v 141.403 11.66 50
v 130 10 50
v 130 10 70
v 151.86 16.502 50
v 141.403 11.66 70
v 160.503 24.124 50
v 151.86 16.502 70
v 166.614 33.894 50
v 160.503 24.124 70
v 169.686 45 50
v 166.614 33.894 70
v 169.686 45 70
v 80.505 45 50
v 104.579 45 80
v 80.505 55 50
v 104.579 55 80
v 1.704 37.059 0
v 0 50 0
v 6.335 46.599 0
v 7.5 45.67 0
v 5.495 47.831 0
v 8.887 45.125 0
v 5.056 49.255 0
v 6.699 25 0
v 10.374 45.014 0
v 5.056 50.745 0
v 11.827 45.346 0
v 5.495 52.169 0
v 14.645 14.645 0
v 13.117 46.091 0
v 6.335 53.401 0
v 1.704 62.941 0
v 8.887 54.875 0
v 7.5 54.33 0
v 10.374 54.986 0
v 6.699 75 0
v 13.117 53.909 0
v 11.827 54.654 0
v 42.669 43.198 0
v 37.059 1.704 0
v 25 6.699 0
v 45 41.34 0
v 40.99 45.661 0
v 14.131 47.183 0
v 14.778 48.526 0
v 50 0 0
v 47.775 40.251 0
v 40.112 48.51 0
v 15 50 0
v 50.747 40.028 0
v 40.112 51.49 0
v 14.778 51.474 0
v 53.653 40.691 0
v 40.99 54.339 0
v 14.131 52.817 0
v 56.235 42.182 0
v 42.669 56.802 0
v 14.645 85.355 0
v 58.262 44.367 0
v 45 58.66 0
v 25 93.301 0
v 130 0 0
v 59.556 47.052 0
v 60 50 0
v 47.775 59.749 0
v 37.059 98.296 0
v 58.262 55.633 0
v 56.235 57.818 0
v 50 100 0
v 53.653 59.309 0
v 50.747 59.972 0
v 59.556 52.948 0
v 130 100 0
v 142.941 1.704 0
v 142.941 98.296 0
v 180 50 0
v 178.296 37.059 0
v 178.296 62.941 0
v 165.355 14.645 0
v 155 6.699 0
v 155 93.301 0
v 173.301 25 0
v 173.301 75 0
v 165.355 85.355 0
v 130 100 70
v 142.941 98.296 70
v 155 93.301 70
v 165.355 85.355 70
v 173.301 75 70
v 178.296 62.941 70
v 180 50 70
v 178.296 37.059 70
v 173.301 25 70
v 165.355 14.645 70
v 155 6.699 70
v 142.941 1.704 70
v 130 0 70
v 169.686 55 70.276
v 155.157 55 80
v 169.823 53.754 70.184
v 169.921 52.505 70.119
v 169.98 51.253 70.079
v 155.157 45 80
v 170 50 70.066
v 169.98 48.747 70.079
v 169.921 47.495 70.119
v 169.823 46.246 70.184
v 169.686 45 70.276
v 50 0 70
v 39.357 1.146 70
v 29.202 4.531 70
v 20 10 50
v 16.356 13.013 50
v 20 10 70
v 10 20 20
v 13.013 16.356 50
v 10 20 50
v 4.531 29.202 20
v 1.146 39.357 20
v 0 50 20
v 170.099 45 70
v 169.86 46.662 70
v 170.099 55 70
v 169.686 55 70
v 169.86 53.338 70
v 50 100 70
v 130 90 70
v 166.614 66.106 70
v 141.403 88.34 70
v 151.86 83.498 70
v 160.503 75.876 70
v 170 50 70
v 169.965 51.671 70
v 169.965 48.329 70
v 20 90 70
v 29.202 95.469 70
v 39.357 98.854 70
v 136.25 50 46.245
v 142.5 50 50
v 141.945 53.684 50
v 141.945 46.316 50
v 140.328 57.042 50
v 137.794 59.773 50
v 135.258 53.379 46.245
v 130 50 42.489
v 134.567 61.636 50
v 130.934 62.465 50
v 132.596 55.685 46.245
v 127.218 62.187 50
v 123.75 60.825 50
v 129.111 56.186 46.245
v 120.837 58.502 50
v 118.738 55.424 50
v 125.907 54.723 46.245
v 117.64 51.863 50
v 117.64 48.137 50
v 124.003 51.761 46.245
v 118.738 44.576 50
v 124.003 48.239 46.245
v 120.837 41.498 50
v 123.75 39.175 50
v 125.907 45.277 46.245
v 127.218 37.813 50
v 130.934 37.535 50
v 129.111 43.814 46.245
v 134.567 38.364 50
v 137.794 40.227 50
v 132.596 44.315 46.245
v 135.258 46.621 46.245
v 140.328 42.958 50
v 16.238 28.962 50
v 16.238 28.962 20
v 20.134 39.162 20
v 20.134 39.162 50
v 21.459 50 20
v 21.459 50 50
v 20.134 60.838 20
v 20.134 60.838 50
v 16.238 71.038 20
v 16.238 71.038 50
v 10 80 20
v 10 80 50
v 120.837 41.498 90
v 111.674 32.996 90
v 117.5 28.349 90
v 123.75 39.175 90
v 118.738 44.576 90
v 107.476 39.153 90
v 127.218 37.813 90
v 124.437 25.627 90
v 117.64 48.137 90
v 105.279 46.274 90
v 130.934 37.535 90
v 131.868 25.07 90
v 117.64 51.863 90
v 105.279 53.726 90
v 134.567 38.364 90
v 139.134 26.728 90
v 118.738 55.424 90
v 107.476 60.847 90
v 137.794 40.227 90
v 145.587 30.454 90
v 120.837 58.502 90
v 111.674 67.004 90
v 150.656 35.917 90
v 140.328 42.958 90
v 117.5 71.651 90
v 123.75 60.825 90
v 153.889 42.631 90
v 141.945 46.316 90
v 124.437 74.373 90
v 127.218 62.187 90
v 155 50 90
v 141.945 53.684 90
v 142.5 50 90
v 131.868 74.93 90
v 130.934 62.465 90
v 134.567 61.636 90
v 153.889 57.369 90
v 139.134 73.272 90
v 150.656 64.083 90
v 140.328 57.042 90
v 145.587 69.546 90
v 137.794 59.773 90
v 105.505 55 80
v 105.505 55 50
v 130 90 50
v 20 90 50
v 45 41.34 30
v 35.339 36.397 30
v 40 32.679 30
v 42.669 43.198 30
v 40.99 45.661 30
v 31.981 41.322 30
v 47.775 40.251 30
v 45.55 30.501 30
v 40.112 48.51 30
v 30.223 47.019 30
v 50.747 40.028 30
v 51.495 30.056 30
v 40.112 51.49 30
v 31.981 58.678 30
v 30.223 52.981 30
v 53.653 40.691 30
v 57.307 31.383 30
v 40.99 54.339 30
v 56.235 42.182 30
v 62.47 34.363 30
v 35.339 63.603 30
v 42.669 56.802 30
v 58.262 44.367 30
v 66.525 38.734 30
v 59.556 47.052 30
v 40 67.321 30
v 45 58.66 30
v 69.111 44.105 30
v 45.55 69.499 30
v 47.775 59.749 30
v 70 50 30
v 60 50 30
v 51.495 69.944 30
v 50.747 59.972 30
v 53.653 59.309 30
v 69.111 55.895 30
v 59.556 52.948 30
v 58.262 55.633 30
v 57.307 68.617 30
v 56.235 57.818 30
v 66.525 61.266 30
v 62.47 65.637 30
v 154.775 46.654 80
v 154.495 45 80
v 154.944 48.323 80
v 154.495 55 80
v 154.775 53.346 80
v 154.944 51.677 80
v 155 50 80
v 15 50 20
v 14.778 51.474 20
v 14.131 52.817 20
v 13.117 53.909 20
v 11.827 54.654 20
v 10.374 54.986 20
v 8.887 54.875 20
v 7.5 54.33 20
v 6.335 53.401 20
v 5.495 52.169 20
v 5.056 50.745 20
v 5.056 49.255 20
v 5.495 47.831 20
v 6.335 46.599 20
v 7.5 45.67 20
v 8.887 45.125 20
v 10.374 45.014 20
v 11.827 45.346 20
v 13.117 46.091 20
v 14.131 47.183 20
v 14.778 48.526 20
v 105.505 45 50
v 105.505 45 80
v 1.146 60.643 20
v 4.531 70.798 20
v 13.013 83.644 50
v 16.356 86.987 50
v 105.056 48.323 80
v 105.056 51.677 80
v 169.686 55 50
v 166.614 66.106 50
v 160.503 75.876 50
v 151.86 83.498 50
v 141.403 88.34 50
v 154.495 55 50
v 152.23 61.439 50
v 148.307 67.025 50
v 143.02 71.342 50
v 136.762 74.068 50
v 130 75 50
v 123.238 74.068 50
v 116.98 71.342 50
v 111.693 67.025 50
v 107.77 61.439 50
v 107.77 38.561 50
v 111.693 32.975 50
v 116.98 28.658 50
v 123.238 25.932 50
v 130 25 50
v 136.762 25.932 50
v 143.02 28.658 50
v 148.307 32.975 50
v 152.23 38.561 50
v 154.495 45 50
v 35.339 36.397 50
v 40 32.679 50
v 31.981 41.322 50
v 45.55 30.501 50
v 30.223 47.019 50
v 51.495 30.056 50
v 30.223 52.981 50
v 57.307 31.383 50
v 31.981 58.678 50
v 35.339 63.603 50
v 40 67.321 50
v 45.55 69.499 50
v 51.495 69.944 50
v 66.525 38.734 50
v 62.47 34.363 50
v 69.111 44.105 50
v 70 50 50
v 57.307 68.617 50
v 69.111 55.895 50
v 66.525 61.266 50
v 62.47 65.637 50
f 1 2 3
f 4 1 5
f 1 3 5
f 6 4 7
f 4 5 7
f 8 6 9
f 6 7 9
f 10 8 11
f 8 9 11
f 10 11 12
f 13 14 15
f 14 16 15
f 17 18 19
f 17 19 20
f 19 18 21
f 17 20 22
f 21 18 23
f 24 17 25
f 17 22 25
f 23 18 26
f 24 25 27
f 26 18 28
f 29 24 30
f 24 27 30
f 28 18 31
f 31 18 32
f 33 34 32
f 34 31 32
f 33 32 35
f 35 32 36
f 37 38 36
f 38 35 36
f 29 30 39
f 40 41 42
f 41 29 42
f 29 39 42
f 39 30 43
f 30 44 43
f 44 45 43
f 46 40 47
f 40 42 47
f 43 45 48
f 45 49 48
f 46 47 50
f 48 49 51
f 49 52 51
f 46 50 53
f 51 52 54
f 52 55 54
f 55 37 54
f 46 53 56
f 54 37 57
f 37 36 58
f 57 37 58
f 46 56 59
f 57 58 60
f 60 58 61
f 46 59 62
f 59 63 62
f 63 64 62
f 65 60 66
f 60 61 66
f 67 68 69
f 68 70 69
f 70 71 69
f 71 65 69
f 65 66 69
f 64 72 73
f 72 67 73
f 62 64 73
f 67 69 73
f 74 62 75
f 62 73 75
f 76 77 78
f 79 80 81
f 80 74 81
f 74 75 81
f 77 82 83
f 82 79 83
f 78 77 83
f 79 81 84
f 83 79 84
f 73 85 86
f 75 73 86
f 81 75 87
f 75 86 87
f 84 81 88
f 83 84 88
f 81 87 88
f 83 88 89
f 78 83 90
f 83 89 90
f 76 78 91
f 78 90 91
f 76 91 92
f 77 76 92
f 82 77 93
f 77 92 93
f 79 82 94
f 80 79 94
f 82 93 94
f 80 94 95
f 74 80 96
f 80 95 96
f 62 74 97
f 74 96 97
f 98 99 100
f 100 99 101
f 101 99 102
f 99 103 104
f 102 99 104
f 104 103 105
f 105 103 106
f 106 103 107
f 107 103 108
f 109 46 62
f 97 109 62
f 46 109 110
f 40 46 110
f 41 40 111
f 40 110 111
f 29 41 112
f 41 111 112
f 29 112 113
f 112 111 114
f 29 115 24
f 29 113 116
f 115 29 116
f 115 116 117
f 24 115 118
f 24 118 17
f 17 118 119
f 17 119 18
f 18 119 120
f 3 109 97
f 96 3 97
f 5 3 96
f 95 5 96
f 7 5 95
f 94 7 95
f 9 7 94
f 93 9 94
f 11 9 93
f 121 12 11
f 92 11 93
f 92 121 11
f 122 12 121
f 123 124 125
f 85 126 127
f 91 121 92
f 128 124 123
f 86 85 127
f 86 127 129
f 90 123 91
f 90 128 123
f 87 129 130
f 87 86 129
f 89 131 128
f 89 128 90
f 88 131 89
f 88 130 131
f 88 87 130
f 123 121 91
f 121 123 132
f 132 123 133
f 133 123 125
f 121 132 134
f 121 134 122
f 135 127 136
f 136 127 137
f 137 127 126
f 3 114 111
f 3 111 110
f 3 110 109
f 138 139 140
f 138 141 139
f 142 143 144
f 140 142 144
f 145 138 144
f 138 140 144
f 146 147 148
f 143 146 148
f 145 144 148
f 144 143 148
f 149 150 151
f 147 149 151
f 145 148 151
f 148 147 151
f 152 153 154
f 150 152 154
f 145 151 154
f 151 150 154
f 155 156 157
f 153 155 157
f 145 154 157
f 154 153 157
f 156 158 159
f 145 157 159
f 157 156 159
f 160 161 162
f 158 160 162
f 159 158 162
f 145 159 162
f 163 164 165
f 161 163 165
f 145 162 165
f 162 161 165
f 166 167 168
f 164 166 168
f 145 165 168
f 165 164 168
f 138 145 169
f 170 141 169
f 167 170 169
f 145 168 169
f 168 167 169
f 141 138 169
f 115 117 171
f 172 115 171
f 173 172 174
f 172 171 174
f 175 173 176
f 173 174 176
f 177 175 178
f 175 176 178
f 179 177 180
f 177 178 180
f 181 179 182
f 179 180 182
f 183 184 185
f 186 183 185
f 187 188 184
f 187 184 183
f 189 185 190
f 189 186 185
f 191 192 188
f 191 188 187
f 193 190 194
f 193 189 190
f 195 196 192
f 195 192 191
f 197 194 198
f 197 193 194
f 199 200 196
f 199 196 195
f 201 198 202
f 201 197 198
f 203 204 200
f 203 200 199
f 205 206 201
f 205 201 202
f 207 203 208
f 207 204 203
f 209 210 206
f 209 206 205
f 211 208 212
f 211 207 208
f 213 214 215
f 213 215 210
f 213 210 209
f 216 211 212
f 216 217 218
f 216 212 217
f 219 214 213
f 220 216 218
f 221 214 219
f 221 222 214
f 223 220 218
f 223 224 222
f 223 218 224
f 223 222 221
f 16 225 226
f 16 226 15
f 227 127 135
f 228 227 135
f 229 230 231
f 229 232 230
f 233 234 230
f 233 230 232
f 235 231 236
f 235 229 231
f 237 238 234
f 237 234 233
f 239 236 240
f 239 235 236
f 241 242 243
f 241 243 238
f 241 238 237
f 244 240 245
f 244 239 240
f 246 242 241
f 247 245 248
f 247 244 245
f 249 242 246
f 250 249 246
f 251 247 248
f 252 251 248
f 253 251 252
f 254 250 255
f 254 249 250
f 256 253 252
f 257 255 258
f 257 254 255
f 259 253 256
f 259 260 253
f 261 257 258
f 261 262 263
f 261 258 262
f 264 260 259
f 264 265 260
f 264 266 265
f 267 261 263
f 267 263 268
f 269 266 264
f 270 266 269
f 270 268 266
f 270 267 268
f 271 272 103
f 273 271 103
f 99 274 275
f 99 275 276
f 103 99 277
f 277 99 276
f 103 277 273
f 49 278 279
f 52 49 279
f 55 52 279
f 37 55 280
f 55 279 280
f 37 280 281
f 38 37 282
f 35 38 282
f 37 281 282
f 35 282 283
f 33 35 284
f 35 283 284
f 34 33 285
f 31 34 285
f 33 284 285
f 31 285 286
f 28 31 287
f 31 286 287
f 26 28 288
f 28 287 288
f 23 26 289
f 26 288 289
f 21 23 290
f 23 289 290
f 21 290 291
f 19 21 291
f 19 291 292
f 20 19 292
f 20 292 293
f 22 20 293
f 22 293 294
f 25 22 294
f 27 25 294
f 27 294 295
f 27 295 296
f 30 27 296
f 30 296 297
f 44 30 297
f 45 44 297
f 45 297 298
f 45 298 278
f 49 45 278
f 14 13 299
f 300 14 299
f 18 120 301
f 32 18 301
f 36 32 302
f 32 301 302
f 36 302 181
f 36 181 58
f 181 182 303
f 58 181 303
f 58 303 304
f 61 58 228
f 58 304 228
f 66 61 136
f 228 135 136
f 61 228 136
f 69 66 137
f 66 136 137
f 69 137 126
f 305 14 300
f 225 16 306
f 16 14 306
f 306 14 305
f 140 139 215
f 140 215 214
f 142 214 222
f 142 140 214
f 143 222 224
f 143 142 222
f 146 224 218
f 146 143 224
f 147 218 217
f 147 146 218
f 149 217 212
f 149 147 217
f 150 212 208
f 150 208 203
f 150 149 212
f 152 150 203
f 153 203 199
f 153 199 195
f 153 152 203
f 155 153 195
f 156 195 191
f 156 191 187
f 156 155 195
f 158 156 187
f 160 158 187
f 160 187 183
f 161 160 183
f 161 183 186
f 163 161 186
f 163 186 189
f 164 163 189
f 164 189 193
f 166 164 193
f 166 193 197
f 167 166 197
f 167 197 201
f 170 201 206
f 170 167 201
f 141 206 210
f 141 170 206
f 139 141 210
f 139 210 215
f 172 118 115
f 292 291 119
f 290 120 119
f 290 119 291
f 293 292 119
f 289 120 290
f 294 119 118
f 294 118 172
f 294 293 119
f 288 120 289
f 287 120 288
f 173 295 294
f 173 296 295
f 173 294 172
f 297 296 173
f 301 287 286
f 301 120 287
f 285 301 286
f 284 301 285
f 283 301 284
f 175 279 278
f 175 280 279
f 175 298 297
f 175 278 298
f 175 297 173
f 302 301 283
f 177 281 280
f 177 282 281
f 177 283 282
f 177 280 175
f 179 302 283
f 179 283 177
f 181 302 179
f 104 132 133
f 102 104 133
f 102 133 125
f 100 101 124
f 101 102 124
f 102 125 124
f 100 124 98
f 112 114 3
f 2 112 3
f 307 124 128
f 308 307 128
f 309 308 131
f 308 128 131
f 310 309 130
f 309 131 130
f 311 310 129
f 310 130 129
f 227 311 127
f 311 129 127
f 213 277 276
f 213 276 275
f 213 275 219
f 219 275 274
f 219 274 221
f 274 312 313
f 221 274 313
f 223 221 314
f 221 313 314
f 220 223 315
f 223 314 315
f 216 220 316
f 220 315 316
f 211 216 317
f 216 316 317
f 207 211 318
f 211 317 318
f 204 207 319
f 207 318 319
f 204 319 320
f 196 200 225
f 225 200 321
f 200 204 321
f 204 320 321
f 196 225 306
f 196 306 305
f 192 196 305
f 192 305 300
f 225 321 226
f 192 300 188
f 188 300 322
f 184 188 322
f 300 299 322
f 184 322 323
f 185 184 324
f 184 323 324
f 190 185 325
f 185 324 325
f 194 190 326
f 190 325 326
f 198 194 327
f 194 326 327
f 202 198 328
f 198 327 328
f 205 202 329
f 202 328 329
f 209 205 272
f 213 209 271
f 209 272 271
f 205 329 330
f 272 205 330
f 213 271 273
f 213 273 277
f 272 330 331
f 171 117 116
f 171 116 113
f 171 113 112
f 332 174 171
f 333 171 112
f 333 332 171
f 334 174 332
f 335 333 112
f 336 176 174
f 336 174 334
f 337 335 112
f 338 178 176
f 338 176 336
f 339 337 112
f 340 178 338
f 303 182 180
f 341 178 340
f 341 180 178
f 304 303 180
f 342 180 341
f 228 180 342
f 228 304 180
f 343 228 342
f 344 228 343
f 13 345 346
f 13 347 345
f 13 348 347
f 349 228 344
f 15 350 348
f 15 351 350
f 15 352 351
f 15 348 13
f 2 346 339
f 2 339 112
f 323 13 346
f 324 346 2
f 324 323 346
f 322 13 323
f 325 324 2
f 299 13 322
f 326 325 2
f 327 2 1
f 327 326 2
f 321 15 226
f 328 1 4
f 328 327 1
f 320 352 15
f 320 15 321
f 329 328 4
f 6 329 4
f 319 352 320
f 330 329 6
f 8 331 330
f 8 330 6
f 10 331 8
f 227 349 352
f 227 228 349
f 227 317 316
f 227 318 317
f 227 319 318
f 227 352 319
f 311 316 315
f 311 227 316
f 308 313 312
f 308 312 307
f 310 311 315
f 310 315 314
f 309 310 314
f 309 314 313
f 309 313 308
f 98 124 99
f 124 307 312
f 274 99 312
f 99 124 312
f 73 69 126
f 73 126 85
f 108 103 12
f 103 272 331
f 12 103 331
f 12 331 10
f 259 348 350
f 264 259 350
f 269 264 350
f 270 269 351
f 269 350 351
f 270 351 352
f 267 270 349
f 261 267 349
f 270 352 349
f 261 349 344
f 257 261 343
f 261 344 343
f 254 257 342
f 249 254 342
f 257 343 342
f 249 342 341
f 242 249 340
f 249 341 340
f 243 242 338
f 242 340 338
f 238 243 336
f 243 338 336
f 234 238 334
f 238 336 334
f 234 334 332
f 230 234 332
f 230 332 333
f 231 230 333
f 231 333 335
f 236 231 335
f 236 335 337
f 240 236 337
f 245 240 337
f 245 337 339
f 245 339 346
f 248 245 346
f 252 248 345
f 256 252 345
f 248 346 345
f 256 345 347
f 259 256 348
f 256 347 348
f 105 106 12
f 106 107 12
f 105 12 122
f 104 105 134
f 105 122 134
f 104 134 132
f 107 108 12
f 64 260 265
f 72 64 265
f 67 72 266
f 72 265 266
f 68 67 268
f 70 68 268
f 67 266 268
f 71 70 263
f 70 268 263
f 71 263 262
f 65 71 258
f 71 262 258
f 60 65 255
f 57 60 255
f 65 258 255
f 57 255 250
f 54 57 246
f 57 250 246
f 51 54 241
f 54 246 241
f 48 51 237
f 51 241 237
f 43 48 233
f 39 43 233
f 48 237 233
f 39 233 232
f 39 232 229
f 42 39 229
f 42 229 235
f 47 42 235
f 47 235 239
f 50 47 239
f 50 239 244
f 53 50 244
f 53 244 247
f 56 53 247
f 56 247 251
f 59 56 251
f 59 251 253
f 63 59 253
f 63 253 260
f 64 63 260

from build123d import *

# Parameters (mm, degrees)
SKETCH1_W                  = 180
SKETCH1_H                  = 100
BOSS_EXTRUDE2_DEPTH        = 70
CUT_EXTRUDE1_DEPTH         = 70
SKETCH3_R                  = 5
CUT_EXTRUDE2_DEPTH         = 70
SKETCH4_R                  = 5
CUT_EXTRUDE3_DEPTH         = 50
SKETCH5_R                  = 10
CUT_EXTRUDE4_DEPTH         = 106
SKETCH6_R                  = 15
CUT_EXTRUDE5_DEPTH         = 40
SKETCH8_R                  = 15
SKETCH8_R_2                = 12.5
BOSS_EXTRUDE3_DEPTH        = 40
SKETCH10_R                 = 12.5
BOSS_EXTRUDE4_DEPTH        = 65
F_25_0MM_DOWEL_HOLE2_D     = 25
F_25_0MM_DOWEL_HOLE2_DEPTH = 20
F_25_0MM_DOWEL_HOLE2_TIP   = 7.510757738
SKETCH12_R                 = 10
SKETCH12_R_2               = 12.5
CUT_EXTRUDE6_DEPTH         = 20
SKETCH13_R                 = 25
SKETCH13_R_2               = 12.5
BOSS_EXTRUDE5_DEPTH        = 40
SKETCH14_R                 = 20
SKETCH14_R_2               = 10
CUT_EXTRUDE7_DEPTH         = 20
BOSS_EXTRUDE10_DEPTH       = 30
BOSS_EXTRUDE13_DEPTH       = 30
CUT_EXTRUDE8_DEPTH         = 5


with BuildPart() as part:
    # Sketch1 → Boss-Extrude2 (new body)
    with BuildSketch(Plane.XY):
        with Locations((90, 50)):
            Rectangle(SKETCH1_W, SKETCH1_H)
    extrude(amount=BOSS_EXTRUDE2_DEPTH)

    # Sketch2 → Cut-Extrude1 (cut)
    with BuildSketch(Plane.XY.offset(70)):
        with BuildLine():
            Line((50, 100), (0, 100))
            Line((0, 100), (0, 50))
            ThreePointArc((0, 50), (14.644660941, 85.355339059), (50, 100))
        make_face()
        with BuildLine():
            ThreePointArc((50, 0), (14.644660941, 14.644660941), (0, 50))
            Line((0, 50), (0, 0))
            Line((0, 0), (50, 0))
        make_face()
        with BuildLine():
            Line((180, 0), (180, 50))
            ThreePointArc((180, 50), (165.355339059, 14.644660941), (130, 0))
            Line((130, 0), (180, 0))
        make_face()
        with BuildLine():
            Line((180, 100), (130, 100))
            ThreePointArc((130, 100), (165.355339059, 85.355339059), (180, 50))
            Line((180, 50), (180, 100))
        make_face()
    extrude(amount=-CUT_EXTRUDE1_DEPTH, mode=Mode.SUBTRACT)

    # Sketch3 → Cut-Extrude2 (cut)
    with BuildSketch(Plane.XY.offset(70)):
        with Locations((10, 50)):
            Circle(SKETCH3_R)
    extrude(amount=-CUT_EXTRUDE2_DEPTH, mode=Mode.SUBTRACT)

    # Sketch4 → Cut-Extrude3 (cut)
    with BuildSketch(Plane.XY.offset(70)):
        with BuildLine():
            ThreePointArc((10, 20), (21.458980338, 50), (10, 80))
            ThreePointArc((10, 80), (0, 50), (10, 20))
        make_face()
        with Locations((10, 50)):
            Circle(SKETCH4_R, mode=Mode.SUBTRACT)
    extrude(amount=-CUT_EXTRUDE3_DEPTH, mode=Mode.SUBTRACT)

    # Sketch5 → Cut-Extrude4 (cut)
    with BuildSketch(Plane.XY.offset(70)):
        with Locations((50, 50)):
            Circle(SKETCH5_R)
    extrude(amount=-CUT_EXTRUDE4_DEPTH, mode=Mode.SUBTRACT)

    # Sketch6 → Cut-Extrude5 (cut)
    with BuildSketch(Plane.XY.offset(70)):
        with Locations((130, 50)):
            Circle(SKETCH6_R)
    extrude(amount=-CUT_EXTRUDE5_DEPTH, mode=Mode.SUBTRACT)

    # Sketch8 → Boss-Extrude3 (add)
    with BuildSketch(Plane.XY.offset(70)):
        with Locations((130, 50)):
            Circle(SKETCH8_R)
        with Locations((130, 50)):
            Circle(SKETCH8_R_2, mode=Mode.SUBTRACT)
    extrude(amount=-BOSS_EXTRUDE3_DEPTH)

    # Sketch10 → Boss-Extrude4 (add)
    with BuildSketch(Plane.XY.offset(70)):
        with Locations((130, 50)):
            Circle(SKETCH10_R)
    extrude(amount=-BOSS_EXTRUDE4_DEPTH)

    # Ø25.0mm Dowel Hole2
    with Locations(Plane(origin=(130, 50, 70), x_dir=(1, 0, 0), z_dir=(0, 0, 1))):
        with Locations((0, 0)):
            Hole(F_25_0MM_DOWEL_HOLE2_D / 2, depth=F_25_0MM_DOWEL_HOLE2_DEPTH)
            with Locations((0, 0, -(F_25_0MM_DOWEL_HOLE2_DEPTH + F_25_0MM_DOWEL_HOLE2_TIP / 2))):  # 118° drill point
                Cone(0, F_25_0MM_DOWEL_HOLE2_D / 2, F_25_0MM_DOWEL_HOLE2_TIP, mode=Mode.SUBTRACT)

    # Sketch12 → Cut-Extrude6 (cut)
    with BuildSketch(Plane.XY.offset(70)):
        with BuildLine():
            ThreePointArc((130, 10), (170, 50), (130, 90))
            Line((130, 90), (20, 90))
            ThreePointArc((20, 90), (14.644660941, 85.355339059), (10, 80))
            ThreePointArc((10, 80), (21.458980338, 50), (10, 20))
            ThreePointArc((10, 20), (14.644660941, 14.644660941), (20, 10))
            Line((20, 10), (130, 10))
        make_face()
        with Locations((50, 50)):
            Circle(SKETCH12_R, mode=Mode.SUBTRACT)
        with Locations((130, 50)):
            Circle(SKETCH12_R_2, mode=Mode.SUBTRACT)
    extrude(amount=-CUT_EXTRUDE6_DEPTH, mode=Mode.SUBTRACT)

    # Sketch13 → Boss-Extrude5 (add)
    with BuildSketch(Plane.XY.offset(50)):
        with Locations((130, 50)):
            Circle(SKETCH13_R)
        with Locations((130, 50)):
            Circle(SKETCH13_R_2, mode=Mode.SUBTRACT)
    extrude(amount=BOSS_EXTRUDE5_DEPTH)

    # Sketch14 → Cut-Extrude7 (cut)
    with BuildSketch(Plane.XY.offset(50)):
        with Locations((50, 50)):
            Circle(SKETCH14_R)
        with Locations((50, 50)):
            Circle(SKETCH14_R_2, mode=Mode.SUBTRACT)
    extrude(amount=-CUT_EXTRUDE7_DEPTH, mode=Mode.SUBTRACT)

    # Sketch15 → Boss-Extrude10 (add)
    with BuildSketch(Plane.XY.offset(50)):
        with BuildLine():
            Line((105.505102572, 45), (105.505102572, 55))
            ThreePointArc((105.505102572, 55), (105, 50), (105.505102572, 45))
        make_face()
        with BuildLine():
            ThreePointArc((105.505102572, 45), (105, 50), (105.505102572, 55))
            Line((105.505102572, 55), (80.505102572, 55))
            Line((80.505102572, 55), (80.505102572, 45))
            Line((80.505102572, 45), (105.505102572, 45))
        make_face()
    extrude(amount=BOSS_EXTRUDE10_DEPTH)

    # Sketch16 → Boss-Extrude13 (add)
    with BuildSketch(Plane.XY.offset(50)):
        with BuildLine():
            Line((169.686269666, 55), (154.494897428, 55))
            ThreePointArc((154.494897428, 55), (155, 50), (154.494897428, 45))
            Line((154.494897428, 45), (169.686269666, 45))
            ThreePointArc((169.686269666, 45), (169.921490369, 47.495083498), (170, 50))
            ThreePointArc((170, 50), (169.921490369, 52.504916502), (169.686269666, 55))
        make_face()
    extrude(amount=BOSS_EXTRUDE13_DEPTH)

    # Sketch18 → Cut-Extrude8 (cut, symmetric)
    with BuildSketch(Plane(origin=(0, 50, 0), x_dir=(1, 0, 0), z_dir=(0, 1, 0))):
        Polygon((155.156999003, -80), (170.098617307, -70), (170.098617307, -80), align=None)
        Polygon((104.578940911, -80), (80.505102572, -50), (80.505102572, -80), align=None)
    extrude(amount=CUT_EXTRUDE8_DEPTH, both=True, mode=Mode.SUBTRACT)


solid = part.part
